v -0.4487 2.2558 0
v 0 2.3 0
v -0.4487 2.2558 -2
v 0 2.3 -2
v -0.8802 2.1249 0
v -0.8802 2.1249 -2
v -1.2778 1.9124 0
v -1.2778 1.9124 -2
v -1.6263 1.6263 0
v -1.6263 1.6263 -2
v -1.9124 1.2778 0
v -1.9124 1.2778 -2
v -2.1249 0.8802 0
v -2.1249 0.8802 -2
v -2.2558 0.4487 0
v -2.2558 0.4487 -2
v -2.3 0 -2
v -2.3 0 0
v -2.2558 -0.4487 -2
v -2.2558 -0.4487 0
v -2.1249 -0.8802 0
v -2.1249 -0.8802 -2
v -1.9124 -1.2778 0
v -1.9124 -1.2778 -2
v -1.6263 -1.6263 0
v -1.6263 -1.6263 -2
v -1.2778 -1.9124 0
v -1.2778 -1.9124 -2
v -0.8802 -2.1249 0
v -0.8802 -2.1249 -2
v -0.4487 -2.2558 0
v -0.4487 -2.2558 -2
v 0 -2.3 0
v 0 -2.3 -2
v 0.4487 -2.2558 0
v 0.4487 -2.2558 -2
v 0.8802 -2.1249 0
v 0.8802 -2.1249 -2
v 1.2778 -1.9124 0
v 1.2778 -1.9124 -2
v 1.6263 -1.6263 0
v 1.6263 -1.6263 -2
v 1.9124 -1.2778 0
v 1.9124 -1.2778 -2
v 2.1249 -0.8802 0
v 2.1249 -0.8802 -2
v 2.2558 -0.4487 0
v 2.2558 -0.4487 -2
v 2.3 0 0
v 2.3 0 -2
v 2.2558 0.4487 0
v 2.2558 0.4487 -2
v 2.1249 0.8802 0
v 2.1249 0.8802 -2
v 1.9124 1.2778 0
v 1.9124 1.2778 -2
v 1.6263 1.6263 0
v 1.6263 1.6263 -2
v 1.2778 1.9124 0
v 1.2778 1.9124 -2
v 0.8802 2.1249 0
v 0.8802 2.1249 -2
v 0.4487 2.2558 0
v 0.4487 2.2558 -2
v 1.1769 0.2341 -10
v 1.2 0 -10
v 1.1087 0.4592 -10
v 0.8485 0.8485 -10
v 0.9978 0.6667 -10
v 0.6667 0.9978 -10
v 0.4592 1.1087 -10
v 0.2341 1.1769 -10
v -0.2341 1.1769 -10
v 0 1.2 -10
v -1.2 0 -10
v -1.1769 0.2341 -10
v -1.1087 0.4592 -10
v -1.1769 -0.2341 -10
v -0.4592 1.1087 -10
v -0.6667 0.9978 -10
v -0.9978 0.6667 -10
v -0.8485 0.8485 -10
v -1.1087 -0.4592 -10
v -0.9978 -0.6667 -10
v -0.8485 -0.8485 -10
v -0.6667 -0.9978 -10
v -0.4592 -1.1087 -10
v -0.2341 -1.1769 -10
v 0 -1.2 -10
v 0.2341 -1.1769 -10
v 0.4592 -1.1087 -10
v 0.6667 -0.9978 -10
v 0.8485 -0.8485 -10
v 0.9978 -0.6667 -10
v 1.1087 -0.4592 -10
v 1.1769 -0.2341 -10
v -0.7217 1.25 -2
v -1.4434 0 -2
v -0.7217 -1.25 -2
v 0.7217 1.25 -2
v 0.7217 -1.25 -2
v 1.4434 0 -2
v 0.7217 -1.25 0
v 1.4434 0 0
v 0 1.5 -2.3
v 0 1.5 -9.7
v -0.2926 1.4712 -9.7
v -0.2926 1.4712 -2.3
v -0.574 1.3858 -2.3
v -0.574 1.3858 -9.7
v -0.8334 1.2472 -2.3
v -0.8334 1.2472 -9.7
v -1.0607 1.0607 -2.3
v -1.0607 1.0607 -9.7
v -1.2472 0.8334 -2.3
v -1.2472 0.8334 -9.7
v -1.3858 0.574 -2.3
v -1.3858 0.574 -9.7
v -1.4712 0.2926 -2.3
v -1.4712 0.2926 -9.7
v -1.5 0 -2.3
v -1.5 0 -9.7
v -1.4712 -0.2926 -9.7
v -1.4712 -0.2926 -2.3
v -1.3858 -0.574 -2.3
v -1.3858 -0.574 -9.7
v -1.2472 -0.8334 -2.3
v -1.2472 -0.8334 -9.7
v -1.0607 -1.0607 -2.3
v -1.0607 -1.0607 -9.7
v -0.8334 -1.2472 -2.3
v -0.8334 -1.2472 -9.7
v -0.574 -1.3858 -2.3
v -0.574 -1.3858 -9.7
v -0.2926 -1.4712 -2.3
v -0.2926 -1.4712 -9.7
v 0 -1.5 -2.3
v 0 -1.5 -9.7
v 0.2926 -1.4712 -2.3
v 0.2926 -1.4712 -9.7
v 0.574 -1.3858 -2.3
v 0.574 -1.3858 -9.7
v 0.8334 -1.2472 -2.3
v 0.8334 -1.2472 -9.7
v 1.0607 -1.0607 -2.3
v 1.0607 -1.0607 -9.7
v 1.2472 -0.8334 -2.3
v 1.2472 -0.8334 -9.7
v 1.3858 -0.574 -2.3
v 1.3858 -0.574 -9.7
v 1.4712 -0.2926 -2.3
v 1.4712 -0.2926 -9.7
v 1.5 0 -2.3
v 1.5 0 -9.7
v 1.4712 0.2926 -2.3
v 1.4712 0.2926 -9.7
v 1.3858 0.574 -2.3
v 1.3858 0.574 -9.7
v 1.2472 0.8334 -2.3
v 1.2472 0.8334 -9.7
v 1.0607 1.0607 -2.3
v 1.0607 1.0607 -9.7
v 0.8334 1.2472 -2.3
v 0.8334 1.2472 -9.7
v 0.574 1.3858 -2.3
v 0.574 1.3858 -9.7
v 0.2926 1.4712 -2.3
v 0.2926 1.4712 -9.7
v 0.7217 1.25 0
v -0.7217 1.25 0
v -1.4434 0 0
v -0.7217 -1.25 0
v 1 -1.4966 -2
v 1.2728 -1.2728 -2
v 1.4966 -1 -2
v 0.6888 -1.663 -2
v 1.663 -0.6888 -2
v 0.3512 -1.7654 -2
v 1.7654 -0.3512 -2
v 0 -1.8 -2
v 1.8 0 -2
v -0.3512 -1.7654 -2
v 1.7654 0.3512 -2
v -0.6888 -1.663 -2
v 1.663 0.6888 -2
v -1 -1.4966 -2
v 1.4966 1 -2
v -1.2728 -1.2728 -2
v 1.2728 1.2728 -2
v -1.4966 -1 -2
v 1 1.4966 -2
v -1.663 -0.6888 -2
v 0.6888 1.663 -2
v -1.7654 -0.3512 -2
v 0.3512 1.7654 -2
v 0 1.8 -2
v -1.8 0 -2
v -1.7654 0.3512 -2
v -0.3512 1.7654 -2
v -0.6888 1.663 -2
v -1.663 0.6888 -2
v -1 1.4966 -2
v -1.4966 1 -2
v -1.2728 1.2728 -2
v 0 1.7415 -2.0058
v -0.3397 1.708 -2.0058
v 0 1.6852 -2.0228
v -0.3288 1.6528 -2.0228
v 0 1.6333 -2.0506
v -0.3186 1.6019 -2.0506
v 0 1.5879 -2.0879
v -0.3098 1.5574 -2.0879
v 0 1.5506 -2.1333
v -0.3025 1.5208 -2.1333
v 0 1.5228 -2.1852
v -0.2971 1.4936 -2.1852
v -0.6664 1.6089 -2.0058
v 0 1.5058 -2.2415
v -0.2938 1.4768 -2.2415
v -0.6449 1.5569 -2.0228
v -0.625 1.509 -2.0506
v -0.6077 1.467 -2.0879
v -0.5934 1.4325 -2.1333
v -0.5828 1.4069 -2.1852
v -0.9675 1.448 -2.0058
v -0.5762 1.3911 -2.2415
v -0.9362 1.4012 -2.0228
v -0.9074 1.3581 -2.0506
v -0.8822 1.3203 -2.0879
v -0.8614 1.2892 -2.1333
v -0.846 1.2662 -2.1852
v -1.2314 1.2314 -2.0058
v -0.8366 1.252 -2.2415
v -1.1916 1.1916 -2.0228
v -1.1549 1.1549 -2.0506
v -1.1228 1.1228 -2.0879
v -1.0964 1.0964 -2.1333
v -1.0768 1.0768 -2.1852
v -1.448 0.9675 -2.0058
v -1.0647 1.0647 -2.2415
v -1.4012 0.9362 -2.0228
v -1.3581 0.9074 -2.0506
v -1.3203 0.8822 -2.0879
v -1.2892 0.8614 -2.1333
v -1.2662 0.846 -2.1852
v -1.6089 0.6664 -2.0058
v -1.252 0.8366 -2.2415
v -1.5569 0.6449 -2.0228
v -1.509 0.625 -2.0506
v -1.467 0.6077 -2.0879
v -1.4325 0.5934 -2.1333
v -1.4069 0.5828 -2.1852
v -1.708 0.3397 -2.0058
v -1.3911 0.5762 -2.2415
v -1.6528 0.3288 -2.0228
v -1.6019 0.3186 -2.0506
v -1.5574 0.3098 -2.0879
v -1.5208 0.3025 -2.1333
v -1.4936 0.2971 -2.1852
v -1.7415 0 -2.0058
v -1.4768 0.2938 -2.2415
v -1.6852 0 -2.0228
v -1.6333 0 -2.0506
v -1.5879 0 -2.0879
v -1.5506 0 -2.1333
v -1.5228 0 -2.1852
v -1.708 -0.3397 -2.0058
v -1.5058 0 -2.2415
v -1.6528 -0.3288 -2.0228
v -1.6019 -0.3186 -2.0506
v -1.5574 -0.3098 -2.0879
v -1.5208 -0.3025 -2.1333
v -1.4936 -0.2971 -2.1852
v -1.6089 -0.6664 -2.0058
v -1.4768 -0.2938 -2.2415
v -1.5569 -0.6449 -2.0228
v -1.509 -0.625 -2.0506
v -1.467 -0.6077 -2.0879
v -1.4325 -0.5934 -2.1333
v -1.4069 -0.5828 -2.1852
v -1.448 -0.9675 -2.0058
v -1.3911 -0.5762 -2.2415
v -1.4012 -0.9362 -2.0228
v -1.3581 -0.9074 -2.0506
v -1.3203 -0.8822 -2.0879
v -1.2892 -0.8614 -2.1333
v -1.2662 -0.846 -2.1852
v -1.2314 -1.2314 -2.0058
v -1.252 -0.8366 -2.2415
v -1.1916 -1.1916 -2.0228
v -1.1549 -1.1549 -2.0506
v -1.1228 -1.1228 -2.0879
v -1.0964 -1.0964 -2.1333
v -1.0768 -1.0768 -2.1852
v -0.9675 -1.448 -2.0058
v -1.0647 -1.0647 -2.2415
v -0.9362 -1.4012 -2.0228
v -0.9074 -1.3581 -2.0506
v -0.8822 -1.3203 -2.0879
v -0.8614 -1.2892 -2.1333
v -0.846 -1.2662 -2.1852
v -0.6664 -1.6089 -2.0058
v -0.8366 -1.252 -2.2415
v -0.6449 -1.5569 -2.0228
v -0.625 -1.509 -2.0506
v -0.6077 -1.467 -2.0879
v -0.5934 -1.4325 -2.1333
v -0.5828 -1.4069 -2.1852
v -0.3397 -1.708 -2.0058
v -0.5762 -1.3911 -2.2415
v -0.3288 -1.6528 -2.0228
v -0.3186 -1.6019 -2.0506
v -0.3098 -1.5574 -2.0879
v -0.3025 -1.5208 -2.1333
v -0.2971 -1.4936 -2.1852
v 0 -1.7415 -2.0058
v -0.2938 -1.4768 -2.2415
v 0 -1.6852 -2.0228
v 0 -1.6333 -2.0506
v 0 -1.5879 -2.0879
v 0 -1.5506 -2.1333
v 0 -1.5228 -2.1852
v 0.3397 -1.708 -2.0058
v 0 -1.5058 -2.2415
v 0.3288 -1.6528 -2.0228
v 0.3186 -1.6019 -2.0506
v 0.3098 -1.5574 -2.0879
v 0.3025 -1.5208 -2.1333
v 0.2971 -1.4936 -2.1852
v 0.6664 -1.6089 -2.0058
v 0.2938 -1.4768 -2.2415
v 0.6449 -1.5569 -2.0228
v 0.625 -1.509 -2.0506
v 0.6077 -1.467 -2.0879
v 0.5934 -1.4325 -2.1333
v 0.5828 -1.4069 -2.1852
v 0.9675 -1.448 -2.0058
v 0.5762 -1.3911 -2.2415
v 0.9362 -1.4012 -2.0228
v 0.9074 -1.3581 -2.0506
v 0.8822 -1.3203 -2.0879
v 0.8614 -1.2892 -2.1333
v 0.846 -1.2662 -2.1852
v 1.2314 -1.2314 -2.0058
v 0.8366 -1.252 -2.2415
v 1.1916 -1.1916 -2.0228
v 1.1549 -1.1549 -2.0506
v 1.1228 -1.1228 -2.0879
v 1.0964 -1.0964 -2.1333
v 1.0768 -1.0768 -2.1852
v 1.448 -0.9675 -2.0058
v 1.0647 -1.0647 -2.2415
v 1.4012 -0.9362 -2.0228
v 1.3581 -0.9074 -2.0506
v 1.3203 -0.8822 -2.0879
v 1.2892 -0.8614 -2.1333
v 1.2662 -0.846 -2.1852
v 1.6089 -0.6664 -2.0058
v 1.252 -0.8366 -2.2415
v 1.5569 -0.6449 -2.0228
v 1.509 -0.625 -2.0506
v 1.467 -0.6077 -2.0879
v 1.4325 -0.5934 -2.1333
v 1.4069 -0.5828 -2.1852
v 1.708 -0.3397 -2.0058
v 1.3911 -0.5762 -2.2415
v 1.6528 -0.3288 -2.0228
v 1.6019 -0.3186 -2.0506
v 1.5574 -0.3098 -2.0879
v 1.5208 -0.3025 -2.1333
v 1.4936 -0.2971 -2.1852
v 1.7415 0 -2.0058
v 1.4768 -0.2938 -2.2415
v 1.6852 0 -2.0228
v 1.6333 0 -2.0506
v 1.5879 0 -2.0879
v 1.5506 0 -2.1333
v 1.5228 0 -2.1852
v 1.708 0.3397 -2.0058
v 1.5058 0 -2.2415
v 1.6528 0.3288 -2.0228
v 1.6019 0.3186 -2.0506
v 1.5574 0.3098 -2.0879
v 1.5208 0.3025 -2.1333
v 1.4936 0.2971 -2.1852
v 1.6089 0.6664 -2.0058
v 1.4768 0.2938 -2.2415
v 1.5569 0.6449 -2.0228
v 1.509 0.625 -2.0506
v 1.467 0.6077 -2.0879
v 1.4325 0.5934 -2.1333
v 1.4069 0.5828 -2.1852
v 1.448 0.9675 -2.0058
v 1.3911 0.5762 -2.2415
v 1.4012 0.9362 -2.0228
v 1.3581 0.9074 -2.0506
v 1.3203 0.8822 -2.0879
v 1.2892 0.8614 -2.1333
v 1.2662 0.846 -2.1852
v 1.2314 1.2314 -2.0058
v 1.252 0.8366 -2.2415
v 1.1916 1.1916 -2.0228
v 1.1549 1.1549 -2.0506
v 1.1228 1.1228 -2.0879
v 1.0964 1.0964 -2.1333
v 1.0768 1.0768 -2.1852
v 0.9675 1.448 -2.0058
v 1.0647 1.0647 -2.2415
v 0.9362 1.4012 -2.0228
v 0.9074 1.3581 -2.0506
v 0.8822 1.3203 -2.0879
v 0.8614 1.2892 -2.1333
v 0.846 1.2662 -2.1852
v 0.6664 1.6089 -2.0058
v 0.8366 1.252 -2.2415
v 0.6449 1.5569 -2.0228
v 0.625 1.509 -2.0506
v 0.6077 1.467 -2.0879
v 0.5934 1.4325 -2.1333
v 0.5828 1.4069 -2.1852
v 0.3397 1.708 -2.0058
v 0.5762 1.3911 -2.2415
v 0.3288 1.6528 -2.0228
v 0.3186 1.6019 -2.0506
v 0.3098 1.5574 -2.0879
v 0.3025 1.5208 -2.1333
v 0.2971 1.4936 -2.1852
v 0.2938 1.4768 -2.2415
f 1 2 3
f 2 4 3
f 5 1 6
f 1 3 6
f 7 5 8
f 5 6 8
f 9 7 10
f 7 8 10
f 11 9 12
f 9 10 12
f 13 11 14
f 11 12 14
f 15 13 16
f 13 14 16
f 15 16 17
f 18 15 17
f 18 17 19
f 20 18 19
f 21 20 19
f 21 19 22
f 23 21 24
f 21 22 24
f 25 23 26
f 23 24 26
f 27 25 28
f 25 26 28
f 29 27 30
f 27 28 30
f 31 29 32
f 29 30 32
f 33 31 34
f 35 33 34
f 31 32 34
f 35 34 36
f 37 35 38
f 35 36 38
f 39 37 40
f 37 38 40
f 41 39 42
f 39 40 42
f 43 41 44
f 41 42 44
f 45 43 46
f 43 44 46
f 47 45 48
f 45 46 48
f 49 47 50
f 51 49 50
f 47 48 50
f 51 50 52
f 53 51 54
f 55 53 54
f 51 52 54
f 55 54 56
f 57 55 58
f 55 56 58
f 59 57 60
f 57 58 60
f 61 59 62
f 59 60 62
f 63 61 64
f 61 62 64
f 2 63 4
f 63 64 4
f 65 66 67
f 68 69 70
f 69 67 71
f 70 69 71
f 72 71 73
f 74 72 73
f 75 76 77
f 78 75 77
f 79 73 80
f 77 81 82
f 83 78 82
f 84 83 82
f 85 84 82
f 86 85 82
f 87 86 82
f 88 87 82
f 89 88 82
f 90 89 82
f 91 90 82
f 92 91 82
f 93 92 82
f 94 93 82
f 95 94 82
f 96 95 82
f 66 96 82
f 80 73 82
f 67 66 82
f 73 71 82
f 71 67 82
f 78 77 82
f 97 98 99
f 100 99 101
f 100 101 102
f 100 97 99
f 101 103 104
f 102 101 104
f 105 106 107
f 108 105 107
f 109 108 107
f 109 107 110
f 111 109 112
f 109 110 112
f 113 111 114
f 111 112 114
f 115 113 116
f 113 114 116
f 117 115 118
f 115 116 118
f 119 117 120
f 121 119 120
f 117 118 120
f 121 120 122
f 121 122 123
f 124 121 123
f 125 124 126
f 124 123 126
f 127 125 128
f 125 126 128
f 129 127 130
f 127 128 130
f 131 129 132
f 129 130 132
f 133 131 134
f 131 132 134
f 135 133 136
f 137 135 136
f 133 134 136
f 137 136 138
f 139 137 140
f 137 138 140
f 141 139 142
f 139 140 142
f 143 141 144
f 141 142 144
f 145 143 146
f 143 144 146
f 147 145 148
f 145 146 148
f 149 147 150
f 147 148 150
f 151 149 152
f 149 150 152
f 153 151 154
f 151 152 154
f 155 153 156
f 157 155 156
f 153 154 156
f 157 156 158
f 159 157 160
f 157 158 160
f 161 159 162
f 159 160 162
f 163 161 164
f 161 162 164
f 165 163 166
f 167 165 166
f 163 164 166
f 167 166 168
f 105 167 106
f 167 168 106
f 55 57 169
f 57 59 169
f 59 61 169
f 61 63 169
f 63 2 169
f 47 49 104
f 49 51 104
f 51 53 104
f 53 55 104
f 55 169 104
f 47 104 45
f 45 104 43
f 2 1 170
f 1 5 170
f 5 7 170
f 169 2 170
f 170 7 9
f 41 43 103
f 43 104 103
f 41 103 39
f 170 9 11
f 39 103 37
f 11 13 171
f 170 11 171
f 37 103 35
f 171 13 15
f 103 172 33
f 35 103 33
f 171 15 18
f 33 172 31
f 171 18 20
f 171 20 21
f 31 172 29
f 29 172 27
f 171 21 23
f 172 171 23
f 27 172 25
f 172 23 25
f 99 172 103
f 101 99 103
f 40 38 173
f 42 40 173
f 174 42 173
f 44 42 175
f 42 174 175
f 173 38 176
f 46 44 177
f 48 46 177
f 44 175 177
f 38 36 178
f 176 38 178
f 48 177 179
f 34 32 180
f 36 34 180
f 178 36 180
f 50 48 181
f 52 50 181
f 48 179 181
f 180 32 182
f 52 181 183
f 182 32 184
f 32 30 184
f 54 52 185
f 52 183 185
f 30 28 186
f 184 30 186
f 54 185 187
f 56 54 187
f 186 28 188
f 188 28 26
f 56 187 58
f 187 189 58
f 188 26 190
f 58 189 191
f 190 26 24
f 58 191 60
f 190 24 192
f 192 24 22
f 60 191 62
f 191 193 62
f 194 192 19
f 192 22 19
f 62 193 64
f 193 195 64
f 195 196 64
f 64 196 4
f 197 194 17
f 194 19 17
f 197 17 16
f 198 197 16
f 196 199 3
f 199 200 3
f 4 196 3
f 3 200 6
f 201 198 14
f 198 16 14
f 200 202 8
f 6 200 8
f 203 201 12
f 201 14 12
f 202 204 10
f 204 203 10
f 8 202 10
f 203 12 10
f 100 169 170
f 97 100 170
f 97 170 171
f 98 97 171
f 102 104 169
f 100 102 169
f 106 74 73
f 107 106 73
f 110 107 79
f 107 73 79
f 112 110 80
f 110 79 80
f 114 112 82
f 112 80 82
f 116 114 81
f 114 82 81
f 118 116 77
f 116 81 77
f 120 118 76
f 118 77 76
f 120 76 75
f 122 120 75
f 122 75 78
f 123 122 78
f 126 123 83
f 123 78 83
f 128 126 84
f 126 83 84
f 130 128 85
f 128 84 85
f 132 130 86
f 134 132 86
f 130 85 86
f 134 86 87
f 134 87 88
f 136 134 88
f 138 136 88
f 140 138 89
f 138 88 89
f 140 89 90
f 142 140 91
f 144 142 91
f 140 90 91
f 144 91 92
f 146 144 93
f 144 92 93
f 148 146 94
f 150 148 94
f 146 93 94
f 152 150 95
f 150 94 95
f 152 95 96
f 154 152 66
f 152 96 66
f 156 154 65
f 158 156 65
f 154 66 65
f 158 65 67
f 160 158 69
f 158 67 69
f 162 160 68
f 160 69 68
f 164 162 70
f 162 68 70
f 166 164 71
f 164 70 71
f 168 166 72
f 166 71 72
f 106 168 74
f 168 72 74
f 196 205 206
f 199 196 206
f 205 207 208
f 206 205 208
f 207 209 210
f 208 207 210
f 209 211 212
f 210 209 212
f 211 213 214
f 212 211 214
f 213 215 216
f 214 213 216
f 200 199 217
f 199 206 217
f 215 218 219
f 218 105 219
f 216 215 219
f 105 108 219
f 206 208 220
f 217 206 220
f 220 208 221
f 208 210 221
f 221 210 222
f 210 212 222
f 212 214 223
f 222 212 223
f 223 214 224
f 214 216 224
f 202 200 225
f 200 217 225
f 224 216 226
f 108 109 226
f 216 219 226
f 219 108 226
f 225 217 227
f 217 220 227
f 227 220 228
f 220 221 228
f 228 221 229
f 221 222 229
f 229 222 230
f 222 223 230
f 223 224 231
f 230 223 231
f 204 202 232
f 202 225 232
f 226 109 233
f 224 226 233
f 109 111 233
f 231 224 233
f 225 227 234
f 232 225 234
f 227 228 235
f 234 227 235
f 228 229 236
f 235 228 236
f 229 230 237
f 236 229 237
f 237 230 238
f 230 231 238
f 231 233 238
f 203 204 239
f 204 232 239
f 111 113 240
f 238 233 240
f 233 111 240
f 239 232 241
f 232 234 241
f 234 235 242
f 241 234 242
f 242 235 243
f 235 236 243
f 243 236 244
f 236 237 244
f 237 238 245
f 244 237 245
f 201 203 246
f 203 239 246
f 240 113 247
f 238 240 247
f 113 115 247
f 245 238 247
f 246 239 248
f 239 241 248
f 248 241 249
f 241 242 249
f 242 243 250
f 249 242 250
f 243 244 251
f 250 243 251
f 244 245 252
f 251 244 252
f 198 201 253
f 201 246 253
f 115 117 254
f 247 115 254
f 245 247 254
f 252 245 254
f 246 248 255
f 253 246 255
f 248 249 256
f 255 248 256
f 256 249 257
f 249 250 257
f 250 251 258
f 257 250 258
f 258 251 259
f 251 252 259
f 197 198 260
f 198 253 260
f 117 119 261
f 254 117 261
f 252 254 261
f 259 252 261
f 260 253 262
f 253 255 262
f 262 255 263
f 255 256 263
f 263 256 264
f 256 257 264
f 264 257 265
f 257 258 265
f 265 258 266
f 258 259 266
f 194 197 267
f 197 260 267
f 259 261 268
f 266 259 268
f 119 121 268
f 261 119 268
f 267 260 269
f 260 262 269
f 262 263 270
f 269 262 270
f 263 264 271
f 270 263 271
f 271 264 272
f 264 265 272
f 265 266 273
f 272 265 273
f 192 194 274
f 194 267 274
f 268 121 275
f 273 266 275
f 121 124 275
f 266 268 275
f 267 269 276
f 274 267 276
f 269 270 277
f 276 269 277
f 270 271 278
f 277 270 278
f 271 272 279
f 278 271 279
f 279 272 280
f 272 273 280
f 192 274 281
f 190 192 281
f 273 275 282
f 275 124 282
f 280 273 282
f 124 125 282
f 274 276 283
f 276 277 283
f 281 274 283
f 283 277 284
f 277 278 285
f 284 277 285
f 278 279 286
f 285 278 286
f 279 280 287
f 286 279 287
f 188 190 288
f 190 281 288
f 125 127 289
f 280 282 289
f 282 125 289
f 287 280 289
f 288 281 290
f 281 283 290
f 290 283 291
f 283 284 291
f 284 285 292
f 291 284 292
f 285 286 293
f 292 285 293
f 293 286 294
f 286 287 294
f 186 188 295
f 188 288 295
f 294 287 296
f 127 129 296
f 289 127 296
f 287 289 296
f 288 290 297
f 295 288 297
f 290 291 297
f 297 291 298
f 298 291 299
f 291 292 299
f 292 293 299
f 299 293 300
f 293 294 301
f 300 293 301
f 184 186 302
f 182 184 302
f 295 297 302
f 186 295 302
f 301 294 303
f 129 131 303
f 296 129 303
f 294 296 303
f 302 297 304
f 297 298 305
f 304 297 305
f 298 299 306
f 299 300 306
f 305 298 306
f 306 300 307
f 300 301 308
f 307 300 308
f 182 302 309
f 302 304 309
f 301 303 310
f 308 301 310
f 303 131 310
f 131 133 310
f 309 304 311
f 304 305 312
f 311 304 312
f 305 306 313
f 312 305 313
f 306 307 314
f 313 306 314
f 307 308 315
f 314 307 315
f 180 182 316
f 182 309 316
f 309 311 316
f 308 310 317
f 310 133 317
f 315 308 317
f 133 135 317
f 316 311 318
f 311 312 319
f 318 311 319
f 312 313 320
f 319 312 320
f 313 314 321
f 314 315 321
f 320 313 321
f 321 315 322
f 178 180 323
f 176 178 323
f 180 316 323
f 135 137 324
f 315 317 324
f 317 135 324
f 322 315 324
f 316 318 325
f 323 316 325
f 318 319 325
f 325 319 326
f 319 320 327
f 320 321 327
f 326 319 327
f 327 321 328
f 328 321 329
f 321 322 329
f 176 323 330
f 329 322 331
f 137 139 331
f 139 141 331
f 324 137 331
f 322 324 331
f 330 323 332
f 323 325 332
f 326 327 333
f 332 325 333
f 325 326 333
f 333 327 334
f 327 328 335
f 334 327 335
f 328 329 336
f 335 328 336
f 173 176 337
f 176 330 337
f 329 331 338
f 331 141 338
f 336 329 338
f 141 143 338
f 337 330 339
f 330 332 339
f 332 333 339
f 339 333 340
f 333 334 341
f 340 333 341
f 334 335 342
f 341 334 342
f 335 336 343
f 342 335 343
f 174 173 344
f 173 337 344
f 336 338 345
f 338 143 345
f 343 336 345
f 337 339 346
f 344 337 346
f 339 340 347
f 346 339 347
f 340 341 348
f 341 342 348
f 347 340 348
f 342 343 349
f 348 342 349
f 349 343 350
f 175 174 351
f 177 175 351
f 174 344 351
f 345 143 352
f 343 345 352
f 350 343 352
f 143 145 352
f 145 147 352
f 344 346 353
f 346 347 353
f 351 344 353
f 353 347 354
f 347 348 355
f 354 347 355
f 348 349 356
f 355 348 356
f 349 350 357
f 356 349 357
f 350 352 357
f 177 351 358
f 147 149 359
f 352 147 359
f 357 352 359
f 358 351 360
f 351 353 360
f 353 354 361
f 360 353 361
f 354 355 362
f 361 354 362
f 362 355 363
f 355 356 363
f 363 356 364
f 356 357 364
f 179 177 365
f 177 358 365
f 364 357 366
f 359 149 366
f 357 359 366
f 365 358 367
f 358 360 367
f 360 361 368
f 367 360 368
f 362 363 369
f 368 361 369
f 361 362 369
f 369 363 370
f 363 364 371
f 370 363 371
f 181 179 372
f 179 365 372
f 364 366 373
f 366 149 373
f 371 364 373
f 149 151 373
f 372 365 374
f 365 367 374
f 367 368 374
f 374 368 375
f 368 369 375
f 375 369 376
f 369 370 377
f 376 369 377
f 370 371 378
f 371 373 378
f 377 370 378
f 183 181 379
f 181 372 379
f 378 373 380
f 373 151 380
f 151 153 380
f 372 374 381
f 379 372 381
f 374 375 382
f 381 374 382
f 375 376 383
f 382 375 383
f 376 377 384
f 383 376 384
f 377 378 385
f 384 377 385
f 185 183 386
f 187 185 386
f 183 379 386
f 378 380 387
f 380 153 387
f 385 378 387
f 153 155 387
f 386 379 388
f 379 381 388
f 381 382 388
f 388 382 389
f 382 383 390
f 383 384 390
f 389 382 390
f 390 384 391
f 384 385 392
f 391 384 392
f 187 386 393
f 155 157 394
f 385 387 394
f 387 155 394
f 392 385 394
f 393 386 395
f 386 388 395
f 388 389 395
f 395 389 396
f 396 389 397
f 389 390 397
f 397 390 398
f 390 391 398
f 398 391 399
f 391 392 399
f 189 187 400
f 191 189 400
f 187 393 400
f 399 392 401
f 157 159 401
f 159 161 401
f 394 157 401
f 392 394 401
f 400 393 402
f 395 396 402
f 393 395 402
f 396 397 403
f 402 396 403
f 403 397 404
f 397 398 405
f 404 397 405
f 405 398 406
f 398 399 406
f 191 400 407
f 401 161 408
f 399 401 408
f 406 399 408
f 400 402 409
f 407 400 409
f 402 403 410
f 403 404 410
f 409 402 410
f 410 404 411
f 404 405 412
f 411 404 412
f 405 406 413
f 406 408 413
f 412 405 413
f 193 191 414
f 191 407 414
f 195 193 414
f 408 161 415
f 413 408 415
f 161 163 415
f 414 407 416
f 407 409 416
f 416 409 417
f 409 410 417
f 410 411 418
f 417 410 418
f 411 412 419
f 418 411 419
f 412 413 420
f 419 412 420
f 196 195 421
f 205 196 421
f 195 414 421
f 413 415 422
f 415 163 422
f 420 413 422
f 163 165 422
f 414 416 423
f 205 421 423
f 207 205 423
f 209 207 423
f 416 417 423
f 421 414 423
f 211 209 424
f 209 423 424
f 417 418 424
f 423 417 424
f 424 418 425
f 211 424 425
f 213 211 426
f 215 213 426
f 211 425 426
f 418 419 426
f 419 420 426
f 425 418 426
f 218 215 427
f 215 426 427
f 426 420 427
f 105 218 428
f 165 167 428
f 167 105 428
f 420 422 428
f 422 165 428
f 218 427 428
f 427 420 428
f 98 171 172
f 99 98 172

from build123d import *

# Parameters (mm, degrees)
CUT_EXTRUDE_1_DEPTH = 2
FILLET_1_R          = 0.3
CHAMFER_1_SIZE      = 0.3


with BuildPart() as part:
    # Эскиз1 → Повернуть1 (revolve)
    with BuildSketch(Plane(origin=(0, 0, 0), x_dir=(0, 0, -1), z_dir=(1, 0, 0))):
        Polygon((0, 0), (0, 2.3), (2, 2.3), (2, 1.5), (10, 1.5), (10, 0), align=None)
    revolve(axis=Axis((0, 0, 0), (0, 0, 1)))

    # Эскиз2 → Вырез-Вытянуть1 (cut)
    with BuildSketch(Plane.XY):
        Polygon((1.443375673, 0), (0.721687836, 1.25), (-0.721687836, 1.25), (-1.443375673, 0), (-0.721687836, -1.25), (0.721687836, -1.25), align=None)
    extrude(amount=-CUT_EXTRUDE_1_DEPTH, mode=Mode.SUBTRACT)

    # Скругление1
    fillet_1_edges = [part.edges().sort_by_distance(p)[0] for p in [
        (0, -1.5, -2),
    ]]
    fillet(fillet_1_edges, radius=FILLET_1_R)

    # Фаска1
    chamfer_1_edges = [part.edges().sort_by_distance(p)[0] for p in [
        (0, -1.5, -10),
    ]]
    chamfer(chamfer_1_edges, length=CHAMFER_1_SIZE)


solid = part.part
